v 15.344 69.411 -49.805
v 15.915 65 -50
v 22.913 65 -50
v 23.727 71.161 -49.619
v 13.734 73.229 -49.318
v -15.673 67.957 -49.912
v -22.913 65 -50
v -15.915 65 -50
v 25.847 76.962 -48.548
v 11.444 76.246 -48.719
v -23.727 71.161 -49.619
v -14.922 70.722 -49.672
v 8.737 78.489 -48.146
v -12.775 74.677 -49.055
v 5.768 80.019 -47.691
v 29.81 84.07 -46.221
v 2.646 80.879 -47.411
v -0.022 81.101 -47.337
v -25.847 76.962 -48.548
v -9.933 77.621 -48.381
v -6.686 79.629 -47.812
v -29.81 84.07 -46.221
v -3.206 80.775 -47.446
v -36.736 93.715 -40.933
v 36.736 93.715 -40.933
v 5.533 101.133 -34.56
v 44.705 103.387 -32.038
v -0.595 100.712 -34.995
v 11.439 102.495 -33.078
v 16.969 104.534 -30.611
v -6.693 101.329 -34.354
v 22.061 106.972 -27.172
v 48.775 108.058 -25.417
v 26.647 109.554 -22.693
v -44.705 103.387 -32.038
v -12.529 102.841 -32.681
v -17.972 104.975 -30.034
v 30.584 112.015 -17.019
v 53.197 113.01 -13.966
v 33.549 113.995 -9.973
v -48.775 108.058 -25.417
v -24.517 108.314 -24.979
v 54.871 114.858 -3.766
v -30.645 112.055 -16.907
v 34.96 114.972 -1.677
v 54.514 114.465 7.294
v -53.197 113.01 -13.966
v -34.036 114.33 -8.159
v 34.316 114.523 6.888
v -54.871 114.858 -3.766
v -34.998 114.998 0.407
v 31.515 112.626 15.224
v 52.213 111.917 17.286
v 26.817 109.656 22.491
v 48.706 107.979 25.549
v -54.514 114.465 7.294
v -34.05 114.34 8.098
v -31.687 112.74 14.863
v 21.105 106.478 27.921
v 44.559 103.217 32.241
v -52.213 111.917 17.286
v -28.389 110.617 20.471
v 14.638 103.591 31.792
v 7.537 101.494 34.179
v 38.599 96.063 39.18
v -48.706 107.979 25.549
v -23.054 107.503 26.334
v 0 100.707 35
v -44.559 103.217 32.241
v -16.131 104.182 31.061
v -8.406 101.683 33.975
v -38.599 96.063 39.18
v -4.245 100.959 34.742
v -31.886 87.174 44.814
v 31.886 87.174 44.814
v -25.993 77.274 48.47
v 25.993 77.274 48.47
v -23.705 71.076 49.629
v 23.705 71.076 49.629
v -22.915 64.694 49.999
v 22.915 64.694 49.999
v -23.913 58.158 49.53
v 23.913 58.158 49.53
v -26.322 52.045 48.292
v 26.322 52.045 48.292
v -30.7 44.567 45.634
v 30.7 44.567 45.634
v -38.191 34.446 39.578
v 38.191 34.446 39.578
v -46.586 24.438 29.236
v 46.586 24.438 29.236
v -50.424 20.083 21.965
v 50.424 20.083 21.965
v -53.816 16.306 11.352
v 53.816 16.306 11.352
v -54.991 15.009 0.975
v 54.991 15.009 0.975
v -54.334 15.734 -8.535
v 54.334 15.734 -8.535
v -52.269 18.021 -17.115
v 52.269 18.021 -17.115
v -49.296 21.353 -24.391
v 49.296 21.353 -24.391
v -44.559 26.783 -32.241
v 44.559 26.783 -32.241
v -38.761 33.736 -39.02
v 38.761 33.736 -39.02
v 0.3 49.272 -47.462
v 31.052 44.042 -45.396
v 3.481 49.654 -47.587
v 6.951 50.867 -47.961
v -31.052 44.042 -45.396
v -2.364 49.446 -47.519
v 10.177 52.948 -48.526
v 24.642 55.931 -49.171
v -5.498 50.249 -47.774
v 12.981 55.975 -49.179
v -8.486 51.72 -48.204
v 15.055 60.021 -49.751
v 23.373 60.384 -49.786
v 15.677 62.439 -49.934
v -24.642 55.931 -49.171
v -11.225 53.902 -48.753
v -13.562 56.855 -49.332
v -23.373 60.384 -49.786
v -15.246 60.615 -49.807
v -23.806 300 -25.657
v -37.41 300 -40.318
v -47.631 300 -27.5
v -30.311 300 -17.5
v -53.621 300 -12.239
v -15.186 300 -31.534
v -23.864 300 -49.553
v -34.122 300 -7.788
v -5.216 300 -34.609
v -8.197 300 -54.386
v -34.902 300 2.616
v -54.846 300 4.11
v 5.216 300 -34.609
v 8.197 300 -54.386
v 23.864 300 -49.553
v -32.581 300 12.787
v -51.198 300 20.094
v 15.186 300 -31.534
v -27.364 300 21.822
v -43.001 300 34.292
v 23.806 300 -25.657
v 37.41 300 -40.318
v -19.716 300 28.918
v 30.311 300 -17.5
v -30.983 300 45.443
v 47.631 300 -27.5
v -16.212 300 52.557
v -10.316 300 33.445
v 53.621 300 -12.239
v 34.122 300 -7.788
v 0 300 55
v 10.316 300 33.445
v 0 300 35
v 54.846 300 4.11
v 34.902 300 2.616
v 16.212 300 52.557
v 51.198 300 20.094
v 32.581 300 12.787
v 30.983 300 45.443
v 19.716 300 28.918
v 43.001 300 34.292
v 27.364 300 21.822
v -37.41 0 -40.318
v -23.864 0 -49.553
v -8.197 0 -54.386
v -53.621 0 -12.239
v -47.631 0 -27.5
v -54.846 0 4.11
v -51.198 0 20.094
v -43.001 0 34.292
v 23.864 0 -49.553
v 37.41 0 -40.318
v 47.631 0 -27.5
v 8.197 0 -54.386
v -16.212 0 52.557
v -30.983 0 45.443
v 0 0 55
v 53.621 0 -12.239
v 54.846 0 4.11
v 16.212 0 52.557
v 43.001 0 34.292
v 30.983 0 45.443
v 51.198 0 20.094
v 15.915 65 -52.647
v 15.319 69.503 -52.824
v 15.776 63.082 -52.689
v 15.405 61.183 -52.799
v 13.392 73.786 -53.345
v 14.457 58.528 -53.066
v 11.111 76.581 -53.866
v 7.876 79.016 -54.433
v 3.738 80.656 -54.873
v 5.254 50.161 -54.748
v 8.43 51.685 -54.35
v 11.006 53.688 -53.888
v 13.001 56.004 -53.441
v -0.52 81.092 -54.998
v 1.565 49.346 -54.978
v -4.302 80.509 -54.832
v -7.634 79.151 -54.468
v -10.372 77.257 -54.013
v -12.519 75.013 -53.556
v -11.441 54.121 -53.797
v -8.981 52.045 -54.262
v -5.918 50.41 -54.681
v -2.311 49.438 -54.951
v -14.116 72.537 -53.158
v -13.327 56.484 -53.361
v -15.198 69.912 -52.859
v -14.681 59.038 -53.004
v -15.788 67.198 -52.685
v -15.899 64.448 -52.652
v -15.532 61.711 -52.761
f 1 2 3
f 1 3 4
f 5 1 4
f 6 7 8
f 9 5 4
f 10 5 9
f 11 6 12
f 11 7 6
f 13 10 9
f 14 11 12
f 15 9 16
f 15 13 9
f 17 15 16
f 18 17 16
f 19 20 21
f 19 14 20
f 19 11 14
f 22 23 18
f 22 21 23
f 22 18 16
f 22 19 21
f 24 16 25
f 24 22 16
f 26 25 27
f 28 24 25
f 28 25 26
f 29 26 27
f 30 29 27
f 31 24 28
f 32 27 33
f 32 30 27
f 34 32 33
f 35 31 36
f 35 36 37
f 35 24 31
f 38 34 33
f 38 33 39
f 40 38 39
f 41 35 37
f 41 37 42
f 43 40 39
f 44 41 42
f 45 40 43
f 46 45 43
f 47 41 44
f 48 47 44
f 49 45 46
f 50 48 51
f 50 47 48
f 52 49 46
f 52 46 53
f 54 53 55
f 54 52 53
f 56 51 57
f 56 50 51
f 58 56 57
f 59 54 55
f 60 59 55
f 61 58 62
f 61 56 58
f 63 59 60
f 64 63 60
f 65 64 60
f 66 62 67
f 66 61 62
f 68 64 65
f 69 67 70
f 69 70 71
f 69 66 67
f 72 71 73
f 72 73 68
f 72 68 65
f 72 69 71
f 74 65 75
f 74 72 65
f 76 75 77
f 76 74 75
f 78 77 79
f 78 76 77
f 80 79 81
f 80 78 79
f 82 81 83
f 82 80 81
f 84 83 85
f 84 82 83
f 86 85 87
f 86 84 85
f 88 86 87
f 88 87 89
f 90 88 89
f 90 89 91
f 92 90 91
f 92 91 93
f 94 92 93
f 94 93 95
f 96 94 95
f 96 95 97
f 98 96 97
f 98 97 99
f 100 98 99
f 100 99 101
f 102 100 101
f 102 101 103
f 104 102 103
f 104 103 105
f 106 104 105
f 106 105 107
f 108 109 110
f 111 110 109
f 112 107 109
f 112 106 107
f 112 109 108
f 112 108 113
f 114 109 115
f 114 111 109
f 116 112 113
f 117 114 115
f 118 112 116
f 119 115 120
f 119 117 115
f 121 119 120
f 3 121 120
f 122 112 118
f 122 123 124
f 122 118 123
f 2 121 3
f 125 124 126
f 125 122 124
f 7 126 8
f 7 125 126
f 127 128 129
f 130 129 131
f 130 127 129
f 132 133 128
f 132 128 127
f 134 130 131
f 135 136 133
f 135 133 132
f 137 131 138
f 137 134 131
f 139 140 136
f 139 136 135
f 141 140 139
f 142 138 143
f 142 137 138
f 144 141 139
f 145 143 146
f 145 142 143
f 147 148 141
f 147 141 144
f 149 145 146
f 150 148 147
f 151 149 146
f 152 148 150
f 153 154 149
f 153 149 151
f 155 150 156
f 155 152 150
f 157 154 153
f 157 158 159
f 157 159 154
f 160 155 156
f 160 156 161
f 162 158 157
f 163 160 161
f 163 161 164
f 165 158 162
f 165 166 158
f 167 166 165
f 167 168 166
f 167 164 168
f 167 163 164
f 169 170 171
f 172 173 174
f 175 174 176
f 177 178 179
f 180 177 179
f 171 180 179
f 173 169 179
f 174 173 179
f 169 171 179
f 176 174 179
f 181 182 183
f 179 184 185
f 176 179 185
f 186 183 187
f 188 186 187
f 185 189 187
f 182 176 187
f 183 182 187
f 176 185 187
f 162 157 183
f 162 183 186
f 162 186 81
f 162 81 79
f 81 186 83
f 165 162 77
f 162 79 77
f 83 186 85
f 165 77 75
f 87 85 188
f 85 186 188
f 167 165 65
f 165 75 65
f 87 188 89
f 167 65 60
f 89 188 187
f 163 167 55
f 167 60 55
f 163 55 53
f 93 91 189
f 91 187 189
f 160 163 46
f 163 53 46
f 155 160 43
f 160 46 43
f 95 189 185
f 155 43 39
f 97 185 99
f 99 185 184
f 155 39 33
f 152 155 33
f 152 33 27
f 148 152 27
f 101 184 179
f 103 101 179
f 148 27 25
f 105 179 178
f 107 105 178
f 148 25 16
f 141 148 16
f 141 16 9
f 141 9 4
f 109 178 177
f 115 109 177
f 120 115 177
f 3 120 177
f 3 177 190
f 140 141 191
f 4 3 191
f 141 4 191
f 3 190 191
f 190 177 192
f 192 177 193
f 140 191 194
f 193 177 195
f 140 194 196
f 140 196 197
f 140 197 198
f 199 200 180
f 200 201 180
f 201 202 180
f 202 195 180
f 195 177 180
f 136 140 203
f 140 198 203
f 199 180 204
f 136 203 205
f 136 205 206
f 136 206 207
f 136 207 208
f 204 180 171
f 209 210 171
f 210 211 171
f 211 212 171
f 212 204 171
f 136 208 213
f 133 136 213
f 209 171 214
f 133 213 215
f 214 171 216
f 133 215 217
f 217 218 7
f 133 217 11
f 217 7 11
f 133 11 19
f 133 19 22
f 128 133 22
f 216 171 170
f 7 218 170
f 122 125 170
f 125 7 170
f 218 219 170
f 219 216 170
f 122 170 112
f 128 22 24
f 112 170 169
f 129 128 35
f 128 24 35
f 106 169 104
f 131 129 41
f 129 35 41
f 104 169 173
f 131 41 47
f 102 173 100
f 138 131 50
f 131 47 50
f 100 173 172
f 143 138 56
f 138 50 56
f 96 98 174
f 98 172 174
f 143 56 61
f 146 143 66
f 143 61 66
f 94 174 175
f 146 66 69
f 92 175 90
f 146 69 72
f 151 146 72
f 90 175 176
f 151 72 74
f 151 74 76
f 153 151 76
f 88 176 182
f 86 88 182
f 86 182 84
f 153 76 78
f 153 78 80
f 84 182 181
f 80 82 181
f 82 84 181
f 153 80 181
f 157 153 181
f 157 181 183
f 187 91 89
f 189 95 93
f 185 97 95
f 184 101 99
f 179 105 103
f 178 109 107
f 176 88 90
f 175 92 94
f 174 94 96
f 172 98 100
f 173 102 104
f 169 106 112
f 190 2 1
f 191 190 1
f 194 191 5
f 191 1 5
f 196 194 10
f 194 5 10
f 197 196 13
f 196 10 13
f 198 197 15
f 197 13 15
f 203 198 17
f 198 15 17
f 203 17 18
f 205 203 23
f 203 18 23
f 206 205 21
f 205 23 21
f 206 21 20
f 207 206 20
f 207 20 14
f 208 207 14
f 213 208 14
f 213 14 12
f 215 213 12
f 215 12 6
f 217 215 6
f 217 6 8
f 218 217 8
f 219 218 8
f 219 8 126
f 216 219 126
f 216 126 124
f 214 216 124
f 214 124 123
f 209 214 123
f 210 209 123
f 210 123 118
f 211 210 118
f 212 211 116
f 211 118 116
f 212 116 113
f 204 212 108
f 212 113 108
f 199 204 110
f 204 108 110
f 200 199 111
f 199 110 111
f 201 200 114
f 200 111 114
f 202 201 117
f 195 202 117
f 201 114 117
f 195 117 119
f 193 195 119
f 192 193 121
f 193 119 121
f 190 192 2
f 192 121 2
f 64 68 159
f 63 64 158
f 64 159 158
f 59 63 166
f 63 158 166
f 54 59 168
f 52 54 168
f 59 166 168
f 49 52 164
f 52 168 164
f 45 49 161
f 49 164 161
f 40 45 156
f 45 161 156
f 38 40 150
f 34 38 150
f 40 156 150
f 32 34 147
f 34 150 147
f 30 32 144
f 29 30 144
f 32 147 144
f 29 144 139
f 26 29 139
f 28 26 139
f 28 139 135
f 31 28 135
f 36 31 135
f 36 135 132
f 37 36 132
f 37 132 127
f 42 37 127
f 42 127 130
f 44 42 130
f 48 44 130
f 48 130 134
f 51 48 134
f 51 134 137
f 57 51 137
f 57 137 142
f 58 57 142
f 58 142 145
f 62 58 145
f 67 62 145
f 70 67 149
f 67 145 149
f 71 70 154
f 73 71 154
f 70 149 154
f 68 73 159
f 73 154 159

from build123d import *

# Parameters (mm, degrees)
SKETCH1_R               = 55
BOSS_EXTRUDE1_DEPTH     = 300
CUT_EXTRUDE2_DEPTH      = 310.919344346
CUT_EXTRUDE2_DEPTH_BACK = 310.919344346
SKETCH5_R               = 50
SKETCH9_R               = 35
CUT_EXTRUDE3_DEPTH      = 211
SKETCH10_R              = 15.915907465
CUT_EXTRUDE4_DEPTH      = 177


with BuildPart() as part:
    # Sketch1 → Boss-Extrude1 (new body)
    with BuildSketch(Plane(origin=(0, 0, 0), x_dir=(1, 0, 0), z_dir=(0, 1, 0))):
        with Locations(Location((0, 0, 0), (0, 0, 270))):
            Circle(SKETCH1_R)
    extrude(amount=BOSS_EXTRUDE1_DEPTH)

    # Sketch5 → Cut-Extrude2 (cut, two sides: drawn at the far end of the back side and taken through both)
    with BuildSketch(Plane(origin=(0, 0, 0), x_dir=(0, 0, -1), z_dir=(1, 0, 0)).offset(-CUT_EXTRUDE2_DEPTH_BACK)):
        with Locations((0, 65)):
            Circle(SKETCH5_R)
    extrude(amount=CUT_EXTRUDE2_DEPTH + CUT_EXTRUDE2_DEPTH_BACK, mode=Mode.SUBTRACT)

    # Sketch9 → Cut-Extrude3 (cut)
    with BuildSketch(Plane(origin=(0, 300, 0), x_dir=(1, 0, 0), z_dir=(0, 1, 0))):
        with Locations(Location((0, 0, 0), (0, 0, 270))):
            Circle(SKETCH9_R)
    extrude(amount=-CUT_EXTRUDE3_DEPTH, mode=Mode.SUBTRACT)

    # Sketch10 → Cut-Extrude4 (cut)
    with BuildSketch(Plane.XY):
        with Locations(Location((0, 65.184966797, 0), (0, 0, 359.334121801))):
            Circle(SKETCH10_R)
    extrude(amount=-CUT_EXTRUDE4_DEPTH, mode=Mode.SUBTRACT)


solid = part.part
